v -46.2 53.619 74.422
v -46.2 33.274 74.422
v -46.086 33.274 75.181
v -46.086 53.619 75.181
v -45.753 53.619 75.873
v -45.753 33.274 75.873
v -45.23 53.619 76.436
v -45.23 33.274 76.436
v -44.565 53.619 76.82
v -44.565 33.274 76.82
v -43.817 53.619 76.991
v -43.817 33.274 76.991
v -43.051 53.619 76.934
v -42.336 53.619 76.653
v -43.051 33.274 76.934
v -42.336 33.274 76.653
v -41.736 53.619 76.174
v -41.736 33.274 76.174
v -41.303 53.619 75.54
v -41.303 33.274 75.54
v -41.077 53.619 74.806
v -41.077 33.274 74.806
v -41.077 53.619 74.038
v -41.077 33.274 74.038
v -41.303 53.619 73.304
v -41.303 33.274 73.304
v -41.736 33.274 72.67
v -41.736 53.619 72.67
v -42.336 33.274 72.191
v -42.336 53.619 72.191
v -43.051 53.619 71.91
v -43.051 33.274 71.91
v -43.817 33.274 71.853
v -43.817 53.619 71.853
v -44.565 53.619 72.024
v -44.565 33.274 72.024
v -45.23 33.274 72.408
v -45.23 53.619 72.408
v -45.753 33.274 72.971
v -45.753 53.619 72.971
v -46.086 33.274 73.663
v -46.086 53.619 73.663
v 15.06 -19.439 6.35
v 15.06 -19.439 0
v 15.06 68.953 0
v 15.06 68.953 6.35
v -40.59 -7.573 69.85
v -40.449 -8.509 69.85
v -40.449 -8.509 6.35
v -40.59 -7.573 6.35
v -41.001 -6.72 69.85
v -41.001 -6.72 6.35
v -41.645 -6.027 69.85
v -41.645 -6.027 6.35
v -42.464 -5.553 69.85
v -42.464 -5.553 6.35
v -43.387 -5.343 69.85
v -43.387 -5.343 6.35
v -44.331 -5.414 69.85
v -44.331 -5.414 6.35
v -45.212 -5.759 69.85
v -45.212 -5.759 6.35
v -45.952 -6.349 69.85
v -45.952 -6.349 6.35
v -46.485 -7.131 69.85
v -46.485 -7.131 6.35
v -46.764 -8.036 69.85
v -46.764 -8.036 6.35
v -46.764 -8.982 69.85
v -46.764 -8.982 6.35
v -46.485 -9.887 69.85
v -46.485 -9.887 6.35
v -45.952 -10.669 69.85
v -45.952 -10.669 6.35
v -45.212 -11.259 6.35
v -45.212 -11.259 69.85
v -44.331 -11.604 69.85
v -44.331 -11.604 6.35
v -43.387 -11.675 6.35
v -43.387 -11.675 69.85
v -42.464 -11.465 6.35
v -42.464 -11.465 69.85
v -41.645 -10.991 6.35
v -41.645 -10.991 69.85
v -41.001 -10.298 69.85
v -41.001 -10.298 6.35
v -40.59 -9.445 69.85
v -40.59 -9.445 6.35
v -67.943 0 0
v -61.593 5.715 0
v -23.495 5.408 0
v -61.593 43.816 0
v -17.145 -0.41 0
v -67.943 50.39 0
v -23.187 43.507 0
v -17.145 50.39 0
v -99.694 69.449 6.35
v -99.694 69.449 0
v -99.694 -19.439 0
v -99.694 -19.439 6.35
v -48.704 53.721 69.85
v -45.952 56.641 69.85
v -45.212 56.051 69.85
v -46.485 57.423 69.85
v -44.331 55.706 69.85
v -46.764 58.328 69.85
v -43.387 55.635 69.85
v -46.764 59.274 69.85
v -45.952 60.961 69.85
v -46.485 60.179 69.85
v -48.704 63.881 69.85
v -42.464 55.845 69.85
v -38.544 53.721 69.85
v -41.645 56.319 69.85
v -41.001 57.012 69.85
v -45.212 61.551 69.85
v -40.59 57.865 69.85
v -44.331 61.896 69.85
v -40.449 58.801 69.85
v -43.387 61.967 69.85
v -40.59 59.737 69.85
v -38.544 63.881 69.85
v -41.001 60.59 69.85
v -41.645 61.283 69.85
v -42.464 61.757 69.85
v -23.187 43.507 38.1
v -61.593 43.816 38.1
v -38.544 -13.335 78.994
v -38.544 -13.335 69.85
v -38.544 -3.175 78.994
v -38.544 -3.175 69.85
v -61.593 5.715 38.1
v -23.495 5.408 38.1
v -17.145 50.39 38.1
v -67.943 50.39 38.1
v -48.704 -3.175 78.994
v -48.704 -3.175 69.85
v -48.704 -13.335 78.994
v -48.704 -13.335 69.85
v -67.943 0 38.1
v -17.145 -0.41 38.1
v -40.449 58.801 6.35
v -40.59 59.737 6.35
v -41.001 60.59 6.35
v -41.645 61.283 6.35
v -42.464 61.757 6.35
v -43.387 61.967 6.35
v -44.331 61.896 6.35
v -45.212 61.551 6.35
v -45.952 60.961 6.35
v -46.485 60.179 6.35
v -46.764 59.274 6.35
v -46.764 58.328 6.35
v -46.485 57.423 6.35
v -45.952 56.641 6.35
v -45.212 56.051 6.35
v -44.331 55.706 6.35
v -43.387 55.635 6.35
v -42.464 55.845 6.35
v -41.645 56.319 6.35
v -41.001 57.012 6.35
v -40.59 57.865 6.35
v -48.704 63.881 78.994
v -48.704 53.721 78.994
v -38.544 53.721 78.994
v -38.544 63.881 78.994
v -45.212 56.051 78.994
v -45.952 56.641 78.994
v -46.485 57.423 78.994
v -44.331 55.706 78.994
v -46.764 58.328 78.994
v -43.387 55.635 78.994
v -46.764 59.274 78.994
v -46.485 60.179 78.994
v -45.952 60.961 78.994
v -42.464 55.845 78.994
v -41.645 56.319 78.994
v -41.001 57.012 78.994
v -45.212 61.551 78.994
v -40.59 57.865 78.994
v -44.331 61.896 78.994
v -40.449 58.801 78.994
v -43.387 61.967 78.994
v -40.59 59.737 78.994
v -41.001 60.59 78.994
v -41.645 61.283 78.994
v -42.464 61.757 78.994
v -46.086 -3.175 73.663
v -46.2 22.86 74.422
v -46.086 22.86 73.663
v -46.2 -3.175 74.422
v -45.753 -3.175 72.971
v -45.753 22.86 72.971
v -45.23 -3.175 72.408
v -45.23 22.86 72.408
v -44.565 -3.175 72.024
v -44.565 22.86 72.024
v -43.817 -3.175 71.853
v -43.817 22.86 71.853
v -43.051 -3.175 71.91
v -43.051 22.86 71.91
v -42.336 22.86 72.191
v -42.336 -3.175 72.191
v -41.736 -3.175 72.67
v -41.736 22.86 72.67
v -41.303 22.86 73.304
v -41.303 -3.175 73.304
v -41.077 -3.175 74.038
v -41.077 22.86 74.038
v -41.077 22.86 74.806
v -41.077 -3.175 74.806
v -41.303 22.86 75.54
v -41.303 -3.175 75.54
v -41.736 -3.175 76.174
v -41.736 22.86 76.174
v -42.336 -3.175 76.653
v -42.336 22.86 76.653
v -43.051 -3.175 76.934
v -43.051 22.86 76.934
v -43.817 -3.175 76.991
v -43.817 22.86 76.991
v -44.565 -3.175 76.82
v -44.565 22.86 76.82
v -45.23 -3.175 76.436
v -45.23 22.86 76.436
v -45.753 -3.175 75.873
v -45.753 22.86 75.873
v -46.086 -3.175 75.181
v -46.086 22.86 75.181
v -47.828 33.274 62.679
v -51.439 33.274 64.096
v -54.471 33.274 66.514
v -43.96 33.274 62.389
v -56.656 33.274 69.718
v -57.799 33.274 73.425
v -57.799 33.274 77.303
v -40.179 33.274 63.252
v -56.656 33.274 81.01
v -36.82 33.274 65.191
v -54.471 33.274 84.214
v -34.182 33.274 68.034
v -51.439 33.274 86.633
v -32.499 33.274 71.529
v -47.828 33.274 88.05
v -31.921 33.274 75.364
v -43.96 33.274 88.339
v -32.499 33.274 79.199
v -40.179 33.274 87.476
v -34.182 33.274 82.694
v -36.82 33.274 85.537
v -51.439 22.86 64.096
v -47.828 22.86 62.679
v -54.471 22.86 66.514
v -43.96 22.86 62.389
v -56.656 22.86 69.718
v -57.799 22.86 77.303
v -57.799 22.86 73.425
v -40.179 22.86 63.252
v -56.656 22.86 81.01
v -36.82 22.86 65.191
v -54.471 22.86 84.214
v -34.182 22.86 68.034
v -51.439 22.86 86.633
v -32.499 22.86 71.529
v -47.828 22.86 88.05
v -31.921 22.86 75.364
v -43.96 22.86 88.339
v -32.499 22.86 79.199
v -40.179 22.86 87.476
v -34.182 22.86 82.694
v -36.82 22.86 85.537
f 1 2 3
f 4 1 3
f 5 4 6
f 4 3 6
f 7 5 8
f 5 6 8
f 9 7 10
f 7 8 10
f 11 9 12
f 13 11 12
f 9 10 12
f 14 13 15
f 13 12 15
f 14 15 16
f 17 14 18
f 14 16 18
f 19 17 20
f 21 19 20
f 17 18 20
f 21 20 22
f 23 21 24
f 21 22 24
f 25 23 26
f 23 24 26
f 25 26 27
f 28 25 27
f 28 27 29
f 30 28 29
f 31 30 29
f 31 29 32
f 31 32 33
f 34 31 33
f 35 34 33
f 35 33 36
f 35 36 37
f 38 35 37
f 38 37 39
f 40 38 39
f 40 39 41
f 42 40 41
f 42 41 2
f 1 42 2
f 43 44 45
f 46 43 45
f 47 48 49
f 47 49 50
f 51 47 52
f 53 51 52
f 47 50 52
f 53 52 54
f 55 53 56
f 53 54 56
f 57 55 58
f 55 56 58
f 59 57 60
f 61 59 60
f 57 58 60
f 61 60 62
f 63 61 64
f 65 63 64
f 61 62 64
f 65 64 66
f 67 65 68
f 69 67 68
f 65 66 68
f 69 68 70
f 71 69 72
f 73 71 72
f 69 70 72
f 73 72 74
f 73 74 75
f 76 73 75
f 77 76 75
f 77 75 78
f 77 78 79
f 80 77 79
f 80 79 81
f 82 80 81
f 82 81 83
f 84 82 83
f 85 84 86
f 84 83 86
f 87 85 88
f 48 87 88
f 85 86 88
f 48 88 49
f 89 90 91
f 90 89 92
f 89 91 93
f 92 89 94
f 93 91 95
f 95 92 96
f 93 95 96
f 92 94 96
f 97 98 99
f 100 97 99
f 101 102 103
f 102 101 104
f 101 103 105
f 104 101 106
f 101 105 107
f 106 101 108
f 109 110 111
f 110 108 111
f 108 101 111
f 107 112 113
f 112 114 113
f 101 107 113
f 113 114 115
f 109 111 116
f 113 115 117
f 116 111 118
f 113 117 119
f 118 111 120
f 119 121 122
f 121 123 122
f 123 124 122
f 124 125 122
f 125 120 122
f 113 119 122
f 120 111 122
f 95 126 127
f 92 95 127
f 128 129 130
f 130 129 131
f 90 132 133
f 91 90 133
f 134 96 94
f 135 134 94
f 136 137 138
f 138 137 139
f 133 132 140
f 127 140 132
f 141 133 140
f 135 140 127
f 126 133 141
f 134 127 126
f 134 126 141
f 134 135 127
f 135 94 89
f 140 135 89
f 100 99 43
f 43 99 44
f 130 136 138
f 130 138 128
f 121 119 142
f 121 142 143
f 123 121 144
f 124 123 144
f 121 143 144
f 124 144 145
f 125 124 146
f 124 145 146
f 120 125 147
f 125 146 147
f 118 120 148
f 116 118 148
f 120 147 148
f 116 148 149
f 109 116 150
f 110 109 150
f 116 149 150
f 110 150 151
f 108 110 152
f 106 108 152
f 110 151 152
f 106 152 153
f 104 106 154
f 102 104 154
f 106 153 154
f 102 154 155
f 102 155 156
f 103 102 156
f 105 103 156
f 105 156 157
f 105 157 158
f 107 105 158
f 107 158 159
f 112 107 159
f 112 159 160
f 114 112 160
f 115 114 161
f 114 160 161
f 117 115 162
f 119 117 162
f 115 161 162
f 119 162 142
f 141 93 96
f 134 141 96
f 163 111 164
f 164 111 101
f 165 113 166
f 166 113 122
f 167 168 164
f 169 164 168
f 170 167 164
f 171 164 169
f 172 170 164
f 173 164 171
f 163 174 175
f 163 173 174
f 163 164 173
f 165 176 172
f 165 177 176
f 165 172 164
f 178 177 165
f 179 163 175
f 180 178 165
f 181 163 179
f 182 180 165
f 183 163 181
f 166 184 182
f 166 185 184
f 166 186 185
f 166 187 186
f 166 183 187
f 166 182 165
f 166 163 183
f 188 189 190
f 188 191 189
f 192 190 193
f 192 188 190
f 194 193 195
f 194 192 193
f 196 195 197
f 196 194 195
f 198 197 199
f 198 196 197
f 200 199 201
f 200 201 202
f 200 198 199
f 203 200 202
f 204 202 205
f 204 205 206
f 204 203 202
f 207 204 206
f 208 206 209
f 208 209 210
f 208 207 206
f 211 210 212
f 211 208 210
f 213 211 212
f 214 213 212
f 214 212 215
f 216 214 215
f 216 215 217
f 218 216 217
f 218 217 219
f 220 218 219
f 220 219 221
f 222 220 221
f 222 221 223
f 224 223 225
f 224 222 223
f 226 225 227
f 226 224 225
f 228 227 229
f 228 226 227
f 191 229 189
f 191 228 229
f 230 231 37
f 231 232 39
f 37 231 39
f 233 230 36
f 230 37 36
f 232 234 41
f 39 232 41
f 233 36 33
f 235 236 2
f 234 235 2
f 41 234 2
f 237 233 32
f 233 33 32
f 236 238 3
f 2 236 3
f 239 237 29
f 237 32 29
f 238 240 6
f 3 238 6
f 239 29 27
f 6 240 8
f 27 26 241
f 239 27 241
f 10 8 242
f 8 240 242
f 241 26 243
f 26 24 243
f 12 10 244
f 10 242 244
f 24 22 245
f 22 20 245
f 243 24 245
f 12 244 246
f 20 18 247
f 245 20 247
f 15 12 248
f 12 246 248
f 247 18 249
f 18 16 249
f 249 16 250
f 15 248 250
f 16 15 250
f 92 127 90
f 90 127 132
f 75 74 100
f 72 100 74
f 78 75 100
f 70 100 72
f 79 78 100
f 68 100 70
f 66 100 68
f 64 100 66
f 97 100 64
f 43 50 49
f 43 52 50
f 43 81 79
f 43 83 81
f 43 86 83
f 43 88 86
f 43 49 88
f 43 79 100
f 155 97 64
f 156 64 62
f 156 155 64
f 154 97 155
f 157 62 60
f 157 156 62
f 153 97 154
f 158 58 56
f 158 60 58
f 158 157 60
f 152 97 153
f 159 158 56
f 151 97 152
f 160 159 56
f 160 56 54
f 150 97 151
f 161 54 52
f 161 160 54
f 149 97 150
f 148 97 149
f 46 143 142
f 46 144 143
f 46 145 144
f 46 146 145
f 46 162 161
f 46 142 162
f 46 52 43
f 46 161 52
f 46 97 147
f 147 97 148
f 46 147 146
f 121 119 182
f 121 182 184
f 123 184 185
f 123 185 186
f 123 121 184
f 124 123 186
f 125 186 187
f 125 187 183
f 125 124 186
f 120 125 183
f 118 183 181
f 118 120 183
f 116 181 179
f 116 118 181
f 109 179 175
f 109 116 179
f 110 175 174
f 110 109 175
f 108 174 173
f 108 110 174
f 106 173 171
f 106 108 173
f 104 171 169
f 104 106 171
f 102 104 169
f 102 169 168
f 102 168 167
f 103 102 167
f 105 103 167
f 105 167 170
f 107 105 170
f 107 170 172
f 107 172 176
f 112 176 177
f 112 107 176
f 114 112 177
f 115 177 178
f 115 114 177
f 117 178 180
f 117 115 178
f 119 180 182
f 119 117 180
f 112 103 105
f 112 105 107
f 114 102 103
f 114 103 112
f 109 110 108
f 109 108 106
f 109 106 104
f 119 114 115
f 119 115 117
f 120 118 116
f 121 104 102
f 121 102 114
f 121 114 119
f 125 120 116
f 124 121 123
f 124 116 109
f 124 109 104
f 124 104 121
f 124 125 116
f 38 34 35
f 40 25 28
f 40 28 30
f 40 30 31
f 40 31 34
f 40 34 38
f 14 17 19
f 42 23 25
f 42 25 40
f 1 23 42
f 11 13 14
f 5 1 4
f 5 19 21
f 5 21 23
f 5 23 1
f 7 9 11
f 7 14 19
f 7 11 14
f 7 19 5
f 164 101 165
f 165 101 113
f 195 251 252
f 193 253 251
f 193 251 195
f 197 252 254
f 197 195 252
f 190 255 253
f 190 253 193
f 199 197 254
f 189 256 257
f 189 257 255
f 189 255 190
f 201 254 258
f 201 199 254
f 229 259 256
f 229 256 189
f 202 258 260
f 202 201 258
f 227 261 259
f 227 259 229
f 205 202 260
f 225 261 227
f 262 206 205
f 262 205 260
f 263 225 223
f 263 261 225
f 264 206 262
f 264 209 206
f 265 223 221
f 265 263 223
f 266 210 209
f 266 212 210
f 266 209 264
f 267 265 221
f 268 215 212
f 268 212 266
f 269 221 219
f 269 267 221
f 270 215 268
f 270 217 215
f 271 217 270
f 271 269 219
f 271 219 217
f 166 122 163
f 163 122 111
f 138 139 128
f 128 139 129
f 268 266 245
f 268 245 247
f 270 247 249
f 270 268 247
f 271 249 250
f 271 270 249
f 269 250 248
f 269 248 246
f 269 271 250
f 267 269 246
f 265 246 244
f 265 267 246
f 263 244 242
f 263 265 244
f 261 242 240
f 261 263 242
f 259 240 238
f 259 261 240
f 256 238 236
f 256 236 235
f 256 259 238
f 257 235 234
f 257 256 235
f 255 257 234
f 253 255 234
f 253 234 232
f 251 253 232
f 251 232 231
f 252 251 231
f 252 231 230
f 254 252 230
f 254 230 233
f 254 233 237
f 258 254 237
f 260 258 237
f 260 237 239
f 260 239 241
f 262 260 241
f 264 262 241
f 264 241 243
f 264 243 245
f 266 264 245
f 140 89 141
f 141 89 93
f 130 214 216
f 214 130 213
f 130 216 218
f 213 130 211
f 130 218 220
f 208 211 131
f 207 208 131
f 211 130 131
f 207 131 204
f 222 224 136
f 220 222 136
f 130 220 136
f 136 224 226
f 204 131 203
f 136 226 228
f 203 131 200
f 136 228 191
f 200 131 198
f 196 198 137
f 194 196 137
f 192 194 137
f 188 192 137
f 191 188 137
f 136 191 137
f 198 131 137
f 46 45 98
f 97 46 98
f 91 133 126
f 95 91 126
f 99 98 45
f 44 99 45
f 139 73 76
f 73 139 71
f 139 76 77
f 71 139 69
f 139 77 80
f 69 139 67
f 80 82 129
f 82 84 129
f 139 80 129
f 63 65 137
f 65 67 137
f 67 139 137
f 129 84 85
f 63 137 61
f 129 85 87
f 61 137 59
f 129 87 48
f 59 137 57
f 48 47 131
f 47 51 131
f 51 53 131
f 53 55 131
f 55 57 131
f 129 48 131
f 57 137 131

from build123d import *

# Parameters (mm, degrees)
F1_DEPTH  = 38.1
F3_DEPTH  = 6.35
F5_DEPTH  = 111.76
F6_R      = 3.175
F7_DEPTH  = 63.5
F8_R      = 3.175
F9_DEPTH  = 9.144
F10_R     = 2.5761417158
F11_DEPTH = 56.7944
F12_R     = 13.0117300102
F13_DEPTH = 33.274
F14_DEPTH = 22.86


with BuildPart() as f1:
    # F0 (on Top) → F1 (new body)
    with BuildSketch(Plane.XY):
        Polygon((-17.1450002551, 50.390333843), (-42.5450002551, 50.390333843), (-67.943348394, 50.390333843), (-67.943348394, 0), (-17.1450002551, -0.409666157), align=None)
    extrude(amount=F1_DEPTH)

    # F4 (on face) → F5 (cut)
    with BuildSketch(Plane.XY.offset(38.1)):
        Polygon((-61.593348394, 43.8162393793), (-61.593348394, 5.7150004432), (-23.4945872898, 5.4077508254), (-23.1873376721, 43.5065119296), align=None)
    extrude(amount=-F5_DEPTH, mode=Mode.SUBTRACT)


with BuildPart() as f3:
    # F2 (on Top) → F3 (new body)
    with BuildSketch(Plane.XY):
        Polygon((15.0603158399, 68.9530000091), (-99.6942445636, 69.448672235), (-99.6942445636, -19.439002499), (15.0603158399, -19.439002499), align=None)
    extrude(amount=F3_DEPTH)

    # F6 (on face) → F7 (join)
    with BuildSketch(Plane.XY.offset(6.35)):
        with Locations((-43.6241216958, 58.8009990752)):
            Circle(F6_R)
        with Locations((-43.6241216958, -8.508999832)):
            Circle(F6_R)
    extrude(amount=F7_DEPTH)

    # F8 (on face) → F9, piece 2 (join)
    with BuildSketch(Plane.XY.offset(69.85)):
        Polygon((-48.7041212618, -3.1750001945), (-48.7041212618, -7.4930000119), (-48.7041212618, -13.3350007236), (-38.5441212618, -13.3350007236), (-38.5441212618, -3.1750001945), align=None)
    extrude(amount=F9_DEPTH)

    # F10 (on face) → F11 (join)
    with BuildSketch(Plane(origin=(0, -3.1750001945, 0), x_dir=(-1, 0, 0), z_dir=(0, 1, 0))):
        with Locations((43.6241212618, 74.422)):
            Circle(F10_R)
    extrude(amount=F11_DEPTH)

    # F12 (on Front) → F13 (join)
    with BuildSketch(Plane.XZ):
        with Locations((-44.9327416718, 75.3640756011)):
            Circle(F12_R)
    extrude(amount=-F13_DEPTH)

    # F14 (cut): a face of the model
    f14_faces = [f3.faces().sort_by_distance(p)[0] for p in [
        (-57.576444381, 0, 75.3640756011),
    ]]
    extrude(f14_faces, amount=-F14_DEPTH, mode=Mode.SUBTRACT)


with BuildPart() as f9:
    # F8 (on face) → F9 (new body)
    with BuildSketch(Plane.XY.offset(69.85)):
        Polygon((-48.7041212618, 63.8810023665), (-48.7041212618, 59.8170012236), (-48.7041212618, 53.7210023665), (-38.5441212618, 53.7210023665), (-38.5441212618, 63.8810023665), align=None)
        with Locations((-43.6241216958, 58.8009990752)):
            Circle(F8_R, mode=Mode.SUBTRACT)
    extrude(amount=F9_DEPTH)


solid = Compound([f1.part, f3.part, f9.part])
